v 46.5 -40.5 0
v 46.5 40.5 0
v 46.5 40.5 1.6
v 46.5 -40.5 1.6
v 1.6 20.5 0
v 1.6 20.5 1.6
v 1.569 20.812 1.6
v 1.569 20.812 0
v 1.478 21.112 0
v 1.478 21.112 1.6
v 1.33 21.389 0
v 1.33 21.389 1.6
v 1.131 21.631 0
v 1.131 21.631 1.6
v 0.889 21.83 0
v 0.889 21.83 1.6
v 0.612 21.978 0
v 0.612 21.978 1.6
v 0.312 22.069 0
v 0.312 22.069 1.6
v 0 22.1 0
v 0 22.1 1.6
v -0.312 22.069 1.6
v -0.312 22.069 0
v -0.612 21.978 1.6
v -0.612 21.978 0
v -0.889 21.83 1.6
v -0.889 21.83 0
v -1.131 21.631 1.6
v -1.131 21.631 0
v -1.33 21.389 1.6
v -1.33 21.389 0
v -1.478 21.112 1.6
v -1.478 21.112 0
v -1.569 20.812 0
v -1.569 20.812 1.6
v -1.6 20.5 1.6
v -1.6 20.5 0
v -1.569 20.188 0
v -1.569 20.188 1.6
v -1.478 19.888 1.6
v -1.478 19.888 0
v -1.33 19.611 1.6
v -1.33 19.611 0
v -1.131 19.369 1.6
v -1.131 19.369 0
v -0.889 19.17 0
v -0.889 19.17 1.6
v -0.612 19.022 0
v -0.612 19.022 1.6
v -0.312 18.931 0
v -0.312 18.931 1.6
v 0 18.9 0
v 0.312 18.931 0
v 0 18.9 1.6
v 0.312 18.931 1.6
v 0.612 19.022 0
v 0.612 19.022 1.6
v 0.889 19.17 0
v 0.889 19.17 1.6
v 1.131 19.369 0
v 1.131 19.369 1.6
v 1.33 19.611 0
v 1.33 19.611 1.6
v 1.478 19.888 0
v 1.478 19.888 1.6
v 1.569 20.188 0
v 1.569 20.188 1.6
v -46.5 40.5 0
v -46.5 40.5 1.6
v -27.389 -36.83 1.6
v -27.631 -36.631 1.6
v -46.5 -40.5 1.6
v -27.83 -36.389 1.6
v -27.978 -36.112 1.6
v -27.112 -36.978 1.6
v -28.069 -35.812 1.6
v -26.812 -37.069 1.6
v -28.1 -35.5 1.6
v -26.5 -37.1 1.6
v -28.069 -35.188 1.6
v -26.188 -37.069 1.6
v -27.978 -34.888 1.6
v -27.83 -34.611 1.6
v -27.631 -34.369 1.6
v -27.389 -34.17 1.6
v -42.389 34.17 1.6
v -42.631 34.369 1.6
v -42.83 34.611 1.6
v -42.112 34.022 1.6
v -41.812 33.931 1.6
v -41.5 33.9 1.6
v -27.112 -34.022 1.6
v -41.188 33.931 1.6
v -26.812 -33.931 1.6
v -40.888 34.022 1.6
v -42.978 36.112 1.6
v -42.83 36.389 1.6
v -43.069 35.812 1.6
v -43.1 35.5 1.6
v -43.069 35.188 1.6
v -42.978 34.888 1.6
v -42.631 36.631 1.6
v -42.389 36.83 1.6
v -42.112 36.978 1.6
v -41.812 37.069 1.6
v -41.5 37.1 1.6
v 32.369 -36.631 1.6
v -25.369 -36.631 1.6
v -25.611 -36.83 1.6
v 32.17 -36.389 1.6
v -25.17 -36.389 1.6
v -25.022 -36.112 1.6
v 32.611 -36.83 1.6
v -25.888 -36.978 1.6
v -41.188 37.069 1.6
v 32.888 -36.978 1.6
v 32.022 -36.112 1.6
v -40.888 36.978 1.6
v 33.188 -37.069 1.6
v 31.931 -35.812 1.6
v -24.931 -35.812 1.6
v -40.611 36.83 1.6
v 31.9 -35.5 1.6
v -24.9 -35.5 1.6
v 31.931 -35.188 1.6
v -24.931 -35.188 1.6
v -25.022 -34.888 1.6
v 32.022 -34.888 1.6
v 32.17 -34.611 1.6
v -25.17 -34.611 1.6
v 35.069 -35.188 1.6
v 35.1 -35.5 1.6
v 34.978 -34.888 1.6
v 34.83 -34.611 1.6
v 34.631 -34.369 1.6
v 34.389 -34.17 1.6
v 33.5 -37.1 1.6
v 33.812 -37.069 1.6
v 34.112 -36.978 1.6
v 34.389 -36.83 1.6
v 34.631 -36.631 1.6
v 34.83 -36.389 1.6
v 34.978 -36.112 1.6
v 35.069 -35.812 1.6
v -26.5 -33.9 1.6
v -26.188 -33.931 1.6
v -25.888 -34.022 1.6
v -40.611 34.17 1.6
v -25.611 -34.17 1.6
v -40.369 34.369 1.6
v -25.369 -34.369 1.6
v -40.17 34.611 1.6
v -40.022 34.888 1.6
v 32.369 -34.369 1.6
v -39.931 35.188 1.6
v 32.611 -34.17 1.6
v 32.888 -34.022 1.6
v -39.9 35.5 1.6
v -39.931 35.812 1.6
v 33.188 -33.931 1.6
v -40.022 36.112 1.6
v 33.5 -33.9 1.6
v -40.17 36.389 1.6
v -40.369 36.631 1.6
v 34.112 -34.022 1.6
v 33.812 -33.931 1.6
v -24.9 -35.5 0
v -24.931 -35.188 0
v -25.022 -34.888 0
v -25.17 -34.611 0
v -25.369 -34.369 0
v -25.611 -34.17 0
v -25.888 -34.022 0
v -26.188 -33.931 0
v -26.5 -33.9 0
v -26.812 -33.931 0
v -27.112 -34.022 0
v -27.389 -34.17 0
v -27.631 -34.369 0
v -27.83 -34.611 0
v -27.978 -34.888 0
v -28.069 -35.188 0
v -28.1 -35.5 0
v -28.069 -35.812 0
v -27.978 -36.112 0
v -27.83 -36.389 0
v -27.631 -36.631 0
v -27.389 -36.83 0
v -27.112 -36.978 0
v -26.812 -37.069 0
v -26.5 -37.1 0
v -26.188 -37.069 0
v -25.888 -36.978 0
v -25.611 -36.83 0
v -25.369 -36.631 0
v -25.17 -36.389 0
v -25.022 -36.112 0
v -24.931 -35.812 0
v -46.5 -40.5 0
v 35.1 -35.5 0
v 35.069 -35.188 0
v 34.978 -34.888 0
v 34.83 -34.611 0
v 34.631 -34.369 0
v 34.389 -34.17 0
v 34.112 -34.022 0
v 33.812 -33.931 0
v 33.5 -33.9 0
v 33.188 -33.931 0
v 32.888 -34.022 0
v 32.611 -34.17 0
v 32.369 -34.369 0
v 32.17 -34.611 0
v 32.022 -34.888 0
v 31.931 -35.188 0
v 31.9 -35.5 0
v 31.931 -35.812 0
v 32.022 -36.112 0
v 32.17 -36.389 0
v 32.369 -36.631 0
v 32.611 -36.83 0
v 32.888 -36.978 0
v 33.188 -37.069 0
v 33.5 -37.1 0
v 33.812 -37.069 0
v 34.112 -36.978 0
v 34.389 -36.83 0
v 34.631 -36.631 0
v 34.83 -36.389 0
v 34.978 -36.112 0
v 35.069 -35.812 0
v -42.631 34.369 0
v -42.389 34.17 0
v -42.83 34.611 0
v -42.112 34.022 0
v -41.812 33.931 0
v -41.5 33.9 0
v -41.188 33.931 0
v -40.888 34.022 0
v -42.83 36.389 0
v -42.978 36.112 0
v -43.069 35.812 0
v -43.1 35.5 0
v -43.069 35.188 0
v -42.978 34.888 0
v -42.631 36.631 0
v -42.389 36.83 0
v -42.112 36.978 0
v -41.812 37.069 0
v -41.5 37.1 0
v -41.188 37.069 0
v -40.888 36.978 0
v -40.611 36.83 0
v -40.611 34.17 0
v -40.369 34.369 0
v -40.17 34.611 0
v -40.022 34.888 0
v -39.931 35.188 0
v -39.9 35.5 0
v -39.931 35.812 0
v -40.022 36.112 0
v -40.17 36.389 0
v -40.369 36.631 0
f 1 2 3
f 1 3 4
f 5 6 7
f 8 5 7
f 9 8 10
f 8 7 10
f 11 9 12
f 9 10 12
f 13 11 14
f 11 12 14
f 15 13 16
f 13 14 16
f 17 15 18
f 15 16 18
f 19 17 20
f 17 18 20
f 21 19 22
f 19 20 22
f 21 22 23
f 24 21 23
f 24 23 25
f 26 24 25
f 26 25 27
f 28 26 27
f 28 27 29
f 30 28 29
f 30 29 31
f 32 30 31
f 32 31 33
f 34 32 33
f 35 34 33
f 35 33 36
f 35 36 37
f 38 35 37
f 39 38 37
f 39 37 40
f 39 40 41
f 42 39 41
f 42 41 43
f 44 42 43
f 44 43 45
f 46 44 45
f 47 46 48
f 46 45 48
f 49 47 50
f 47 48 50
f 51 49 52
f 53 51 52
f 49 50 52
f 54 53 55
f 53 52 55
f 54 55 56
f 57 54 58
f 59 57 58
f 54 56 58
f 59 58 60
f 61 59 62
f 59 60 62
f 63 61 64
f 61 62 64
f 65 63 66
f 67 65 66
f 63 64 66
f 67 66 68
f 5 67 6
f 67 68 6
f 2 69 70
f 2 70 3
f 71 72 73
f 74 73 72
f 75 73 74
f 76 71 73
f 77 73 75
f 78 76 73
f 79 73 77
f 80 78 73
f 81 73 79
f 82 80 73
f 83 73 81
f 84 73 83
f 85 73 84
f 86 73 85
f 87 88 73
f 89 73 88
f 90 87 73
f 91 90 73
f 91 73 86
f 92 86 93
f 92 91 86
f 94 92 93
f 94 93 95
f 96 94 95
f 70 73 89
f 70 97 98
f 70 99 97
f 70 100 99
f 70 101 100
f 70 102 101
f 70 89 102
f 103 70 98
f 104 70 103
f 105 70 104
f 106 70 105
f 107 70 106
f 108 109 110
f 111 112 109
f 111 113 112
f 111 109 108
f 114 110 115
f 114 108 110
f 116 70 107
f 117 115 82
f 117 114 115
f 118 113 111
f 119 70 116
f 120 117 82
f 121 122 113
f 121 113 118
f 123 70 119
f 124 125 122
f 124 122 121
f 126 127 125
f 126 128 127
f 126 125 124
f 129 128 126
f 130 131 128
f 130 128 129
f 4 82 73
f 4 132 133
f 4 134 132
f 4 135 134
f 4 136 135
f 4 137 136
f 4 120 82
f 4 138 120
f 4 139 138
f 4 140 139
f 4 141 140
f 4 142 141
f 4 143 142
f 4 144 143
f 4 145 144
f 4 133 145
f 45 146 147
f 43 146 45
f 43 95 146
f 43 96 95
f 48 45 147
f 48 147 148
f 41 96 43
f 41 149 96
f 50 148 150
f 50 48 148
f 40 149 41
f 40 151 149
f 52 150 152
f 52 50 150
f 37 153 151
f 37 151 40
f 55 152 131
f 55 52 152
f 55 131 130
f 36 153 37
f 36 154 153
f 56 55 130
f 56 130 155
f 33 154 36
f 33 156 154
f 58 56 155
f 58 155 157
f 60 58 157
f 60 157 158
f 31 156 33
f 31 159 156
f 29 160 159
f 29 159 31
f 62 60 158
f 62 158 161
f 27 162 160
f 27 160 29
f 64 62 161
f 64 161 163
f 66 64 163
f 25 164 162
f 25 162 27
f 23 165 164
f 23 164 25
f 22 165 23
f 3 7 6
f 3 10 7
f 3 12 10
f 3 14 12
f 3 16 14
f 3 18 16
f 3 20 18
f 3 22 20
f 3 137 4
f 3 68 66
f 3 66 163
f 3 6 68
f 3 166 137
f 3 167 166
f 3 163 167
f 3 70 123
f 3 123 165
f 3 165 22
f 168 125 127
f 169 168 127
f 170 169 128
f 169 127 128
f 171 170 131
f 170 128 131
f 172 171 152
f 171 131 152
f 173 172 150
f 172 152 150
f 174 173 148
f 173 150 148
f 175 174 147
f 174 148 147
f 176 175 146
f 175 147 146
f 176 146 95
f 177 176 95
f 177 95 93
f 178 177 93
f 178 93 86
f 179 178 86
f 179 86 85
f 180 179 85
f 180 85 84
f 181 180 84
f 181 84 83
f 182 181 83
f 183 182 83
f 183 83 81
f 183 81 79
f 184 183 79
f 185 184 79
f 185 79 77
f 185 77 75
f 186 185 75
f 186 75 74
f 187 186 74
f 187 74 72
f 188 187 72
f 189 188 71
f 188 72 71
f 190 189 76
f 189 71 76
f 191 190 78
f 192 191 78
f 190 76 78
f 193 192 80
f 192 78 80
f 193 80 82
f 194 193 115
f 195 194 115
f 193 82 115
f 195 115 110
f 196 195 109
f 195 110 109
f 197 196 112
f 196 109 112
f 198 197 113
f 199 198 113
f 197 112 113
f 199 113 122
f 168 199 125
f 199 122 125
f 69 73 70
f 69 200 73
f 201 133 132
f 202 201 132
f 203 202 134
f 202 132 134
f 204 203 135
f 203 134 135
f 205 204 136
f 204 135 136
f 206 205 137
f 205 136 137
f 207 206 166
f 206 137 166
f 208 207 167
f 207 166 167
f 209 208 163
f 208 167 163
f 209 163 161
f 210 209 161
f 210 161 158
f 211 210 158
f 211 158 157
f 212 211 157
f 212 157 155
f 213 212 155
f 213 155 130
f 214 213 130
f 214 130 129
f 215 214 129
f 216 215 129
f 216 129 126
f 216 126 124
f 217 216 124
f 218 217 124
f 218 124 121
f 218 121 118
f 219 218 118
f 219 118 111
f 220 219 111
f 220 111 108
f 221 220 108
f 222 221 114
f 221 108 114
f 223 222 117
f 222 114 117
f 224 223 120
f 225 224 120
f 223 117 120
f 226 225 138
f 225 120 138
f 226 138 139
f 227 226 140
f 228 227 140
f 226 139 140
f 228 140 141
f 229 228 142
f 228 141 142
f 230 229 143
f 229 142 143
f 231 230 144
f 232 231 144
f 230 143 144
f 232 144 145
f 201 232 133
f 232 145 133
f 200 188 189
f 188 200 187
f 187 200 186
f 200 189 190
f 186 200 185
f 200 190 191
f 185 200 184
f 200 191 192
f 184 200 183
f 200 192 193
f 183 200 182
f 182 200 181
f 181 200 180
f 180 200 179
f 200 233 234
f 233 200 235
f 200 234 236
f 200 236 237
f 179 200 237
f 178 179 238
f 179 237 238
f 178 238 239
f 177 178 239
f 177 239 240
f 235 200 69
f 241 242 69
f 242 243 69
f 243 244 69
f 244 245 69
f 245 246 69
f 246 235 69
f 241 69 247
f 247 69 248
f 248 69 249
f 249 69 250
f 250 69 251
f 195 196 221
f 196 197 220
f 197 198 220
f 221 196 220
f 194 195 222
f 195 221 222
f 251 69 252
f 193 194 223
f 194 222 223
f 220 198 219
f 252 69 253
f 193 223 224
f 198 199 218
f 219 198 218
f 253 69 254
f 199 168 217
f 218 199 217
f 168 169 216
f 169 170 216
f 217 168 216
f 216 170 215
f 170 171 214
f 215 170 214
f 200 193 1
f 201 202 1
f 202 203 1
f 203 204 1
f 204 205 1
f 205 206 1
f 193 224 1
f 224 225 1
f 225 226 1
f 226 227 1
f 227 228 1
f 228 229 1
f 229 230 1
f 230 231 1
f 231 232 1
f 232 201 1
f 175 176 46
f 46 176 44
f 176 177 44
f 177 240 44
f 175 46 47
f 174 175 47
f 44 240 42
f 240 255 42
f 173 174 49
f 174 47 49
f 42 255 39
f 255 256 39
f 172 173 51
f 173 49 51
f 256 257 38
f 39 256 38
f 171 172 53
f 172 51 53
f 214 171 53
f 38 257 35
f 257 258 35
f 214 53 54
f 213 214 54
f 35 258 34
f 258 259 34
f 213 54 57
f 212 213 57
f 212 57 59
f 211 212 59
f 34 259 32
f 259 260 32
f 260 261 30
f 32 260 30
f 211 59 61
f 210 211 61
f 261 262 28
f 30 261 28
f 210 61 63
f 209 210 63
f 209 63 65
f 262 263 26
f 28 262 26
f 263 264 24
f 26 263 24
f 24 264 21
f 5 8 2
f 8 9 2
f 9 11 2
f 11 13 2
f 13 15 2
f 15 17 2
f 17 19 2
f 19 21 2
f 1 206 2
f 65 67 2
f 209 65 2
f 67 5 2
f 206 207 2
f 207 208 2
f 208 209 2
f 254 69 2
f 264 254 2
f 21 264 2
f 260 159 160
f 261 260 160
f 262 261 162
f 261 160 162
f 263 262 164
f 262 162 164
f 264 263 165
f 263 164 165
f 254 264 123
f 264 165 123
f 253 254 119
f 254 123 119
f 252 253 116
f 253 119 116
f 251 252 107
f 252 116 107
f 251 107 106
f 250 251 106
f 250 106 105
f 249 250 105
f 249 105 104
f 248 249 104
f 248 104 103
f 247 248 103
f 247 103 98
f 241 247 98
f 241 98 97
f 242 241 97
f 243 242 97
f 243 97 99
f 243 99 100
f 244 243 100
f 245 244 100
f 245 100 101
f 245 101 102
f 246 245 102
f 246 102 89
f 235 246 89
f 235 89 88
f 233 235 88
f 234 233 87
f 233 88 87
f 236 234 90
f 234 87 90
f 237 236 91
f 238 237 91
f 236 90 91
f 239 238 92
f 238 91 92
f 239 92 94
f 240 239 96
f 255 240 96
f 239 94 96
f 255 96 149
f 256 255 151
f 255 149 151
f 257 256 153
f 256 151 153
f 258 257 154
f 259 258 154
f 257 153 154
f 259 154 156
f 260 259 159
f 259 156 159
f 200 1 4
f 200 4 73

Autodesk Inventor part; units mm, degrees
ref_plane "YZ Plane" through (0, 0, 0) normal (1, 0, 0) x (0, 1, 0)
ref_plane "XZ Plane" through (0, 0, 0) normal (0, 1, 0) x (-1, 0, 0)
ref_plane "XY Plane" through (0, 0, 0) normal (0, 0, 1) x (1, 0, 0)
sketch "スケッチ1" plane through (0, 0, 0) normal (0, 0, 1) x (1, 0, 0)
  line L0 (46.5, -40.5) -> (-46.5, -40.5)
  line L1 (-46.5, -40.5) -> (-46.5, 40.5)
  line L2 (-46.5, 40.5) -> (46.5, 40.5)
  line L3 (46.5, 40.5) -> (46.5, -40.5)
  line L4 (46.5, -40.5) -> (-46.5, 40.5) construction
  line L5 (-46.5, -40.5) -> (46.5, 40.5) construction
  point P0 (0, 0)
  dimension "d0" = 93
  dimension "d1" = 81
extrude "押し出し1" add sketch "スケッチ1" along normal blind 1.6
sketch "スケッチ2" plane through (0, 0, 1.6) normal (0, 0, 1) x (1, 0, 0)
  circle A0 centre (-41.5, 35.5) radius 1.6
  line L0 (46.5, 40.5) -> (-46.5, 40.5) projected
  line L1 (-46.5, 40.5) -> (-46.5, -40.5) projected
  circle A1 centre (-26.5, -35.5) radius 1.6
  line L2 (-46.5, -40.5) -> (46.5, -40.5) projected
  circle A2 centre (33.5, -35.5) radius 1.6
  circle A3 centre (0, 20.5) radius 1.6
  point P0 (0, 0)
  dimension "d4" = 3.2
  dimension "d5" = 5
  dimension "d6" = 5
  dimension "d7" = 3.2
  dimension "d8" = 20
  dimension "d9" = 5
  dimension "d11" = 80
  dimension "d14" = 20
extrude "押し出し2" cut sketch "スケッチ2" against normal through all
equation "\"d9\" = d5"
properties part number "board"
